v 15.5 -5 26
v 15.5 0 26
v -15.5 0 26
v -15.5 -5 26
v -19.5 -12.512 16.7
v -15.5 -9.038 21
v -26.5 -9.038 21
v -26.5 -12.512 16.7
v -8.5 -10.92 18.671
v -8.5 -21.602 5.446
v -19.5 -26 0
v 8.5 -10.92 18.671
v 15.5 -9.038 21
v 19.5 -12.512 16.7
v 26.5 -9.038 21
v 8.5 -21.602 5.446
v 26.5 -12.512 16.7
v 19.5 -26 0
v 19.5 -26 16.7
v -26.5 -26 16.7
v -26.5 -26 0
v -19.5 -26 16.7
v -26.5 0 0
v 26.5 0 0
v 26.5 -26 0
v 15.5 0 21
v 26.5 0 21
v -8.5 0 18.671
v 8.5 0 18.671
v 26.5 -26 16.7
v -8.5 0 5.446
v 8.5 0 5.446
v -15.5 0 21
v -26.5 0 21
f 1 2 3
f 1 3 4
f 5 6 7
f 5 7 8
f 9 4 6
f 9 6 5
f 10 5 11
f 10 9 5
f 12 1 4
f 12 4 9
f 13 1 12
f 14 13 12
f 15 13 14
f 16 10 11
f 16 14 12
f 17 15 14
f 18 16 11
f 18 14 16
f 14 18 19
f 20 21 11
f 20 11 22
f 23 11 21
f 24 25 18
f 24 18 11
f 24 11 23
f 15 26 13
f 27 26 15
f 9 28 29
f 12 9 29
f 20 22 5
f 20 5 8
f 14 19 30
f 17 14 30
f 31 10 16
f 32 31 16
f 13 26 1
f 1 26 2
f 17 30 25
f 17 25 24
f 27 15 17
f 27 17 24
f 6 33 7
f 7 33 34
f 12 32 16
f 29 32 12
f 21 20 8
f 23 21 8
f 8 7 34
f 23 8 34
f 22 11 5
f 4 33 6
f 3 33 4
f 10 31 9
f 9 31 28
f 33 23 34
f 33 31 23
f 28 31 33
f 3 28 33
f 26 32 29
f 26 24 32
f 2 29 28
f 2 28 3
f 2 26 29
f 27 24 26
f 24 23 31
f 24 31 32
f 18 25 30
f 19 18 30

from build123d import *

# Parameters (mm, degrees)
PAD_DEPTH       = 26.5
PAD_DEPTH_BACK  = 26.5
SKETCH001_W     = 5
SKETCH001_H     = 11
POCKET_DEPTH    = 155.012627
SKETCH002_W     = 16.7
SKETCH002_H     = 7
PAD001_DEPTH    = 26
SKETCH004_W     = 13.225
SKETCH004_H     = 17
POCKET001_DEPTH = 26.001


with BuildPart() as part:
    # Sketch → Pad (new body, two sides)
    with BuildSketch(Plane.YZ) as pad_sk:
        Polygon((0, 0), (0, 26), (-5, 26), (-26, 0), align=None)
    extrude(amount=PAD_DEPTH)
    extrude(pad_sk.sketch, amount=-PAD_DEPTH_BACK)

    # Sketch001 (on Face1 of Pad) → Pocket (cut, through all)
    with BuildSketch(Plane.ZX):
        with Locations((23.5, 21)):
            Rectangle(SKETCH001_W, SKETCH001_H)
    pocket = extrude(amount=-POCKET_DEPTH, mode=Mode.SUBTRACT)

    # Mirrored: Pocket across Sketch001 H_Axis
    add(pocket.mirror(Plane.YZ), mode=Mode.SUBTRACT)

    # Sketch002 (on Face1 of Mirrored) → Pad001 (join)
    with BuildSketch(Plane.ZX):
        with Locations((8.35, 23)):
            Rectangle(SKETCH002_W, SKETCH002_H)
    pad001 = extrude(amount=-PAD001_DEPTH)

    # Mirrored001: Pad001 across Sketch002 H_Axis
    add(pad001.mirror(Plane.YZ))

    # Sketch004 (on Face3 of Mirrored001) → Pocket001 (cut, through all)
    with BuildSketch(Plane.ZX):
        with Locations((12.058088, 0)):
            Rectangle(SKETCH004_W, SKETCH004_H)
    extrude(amount=-POCKET001_DEPTH, mode=Mode.SUBTRACT)


solid = part.part
